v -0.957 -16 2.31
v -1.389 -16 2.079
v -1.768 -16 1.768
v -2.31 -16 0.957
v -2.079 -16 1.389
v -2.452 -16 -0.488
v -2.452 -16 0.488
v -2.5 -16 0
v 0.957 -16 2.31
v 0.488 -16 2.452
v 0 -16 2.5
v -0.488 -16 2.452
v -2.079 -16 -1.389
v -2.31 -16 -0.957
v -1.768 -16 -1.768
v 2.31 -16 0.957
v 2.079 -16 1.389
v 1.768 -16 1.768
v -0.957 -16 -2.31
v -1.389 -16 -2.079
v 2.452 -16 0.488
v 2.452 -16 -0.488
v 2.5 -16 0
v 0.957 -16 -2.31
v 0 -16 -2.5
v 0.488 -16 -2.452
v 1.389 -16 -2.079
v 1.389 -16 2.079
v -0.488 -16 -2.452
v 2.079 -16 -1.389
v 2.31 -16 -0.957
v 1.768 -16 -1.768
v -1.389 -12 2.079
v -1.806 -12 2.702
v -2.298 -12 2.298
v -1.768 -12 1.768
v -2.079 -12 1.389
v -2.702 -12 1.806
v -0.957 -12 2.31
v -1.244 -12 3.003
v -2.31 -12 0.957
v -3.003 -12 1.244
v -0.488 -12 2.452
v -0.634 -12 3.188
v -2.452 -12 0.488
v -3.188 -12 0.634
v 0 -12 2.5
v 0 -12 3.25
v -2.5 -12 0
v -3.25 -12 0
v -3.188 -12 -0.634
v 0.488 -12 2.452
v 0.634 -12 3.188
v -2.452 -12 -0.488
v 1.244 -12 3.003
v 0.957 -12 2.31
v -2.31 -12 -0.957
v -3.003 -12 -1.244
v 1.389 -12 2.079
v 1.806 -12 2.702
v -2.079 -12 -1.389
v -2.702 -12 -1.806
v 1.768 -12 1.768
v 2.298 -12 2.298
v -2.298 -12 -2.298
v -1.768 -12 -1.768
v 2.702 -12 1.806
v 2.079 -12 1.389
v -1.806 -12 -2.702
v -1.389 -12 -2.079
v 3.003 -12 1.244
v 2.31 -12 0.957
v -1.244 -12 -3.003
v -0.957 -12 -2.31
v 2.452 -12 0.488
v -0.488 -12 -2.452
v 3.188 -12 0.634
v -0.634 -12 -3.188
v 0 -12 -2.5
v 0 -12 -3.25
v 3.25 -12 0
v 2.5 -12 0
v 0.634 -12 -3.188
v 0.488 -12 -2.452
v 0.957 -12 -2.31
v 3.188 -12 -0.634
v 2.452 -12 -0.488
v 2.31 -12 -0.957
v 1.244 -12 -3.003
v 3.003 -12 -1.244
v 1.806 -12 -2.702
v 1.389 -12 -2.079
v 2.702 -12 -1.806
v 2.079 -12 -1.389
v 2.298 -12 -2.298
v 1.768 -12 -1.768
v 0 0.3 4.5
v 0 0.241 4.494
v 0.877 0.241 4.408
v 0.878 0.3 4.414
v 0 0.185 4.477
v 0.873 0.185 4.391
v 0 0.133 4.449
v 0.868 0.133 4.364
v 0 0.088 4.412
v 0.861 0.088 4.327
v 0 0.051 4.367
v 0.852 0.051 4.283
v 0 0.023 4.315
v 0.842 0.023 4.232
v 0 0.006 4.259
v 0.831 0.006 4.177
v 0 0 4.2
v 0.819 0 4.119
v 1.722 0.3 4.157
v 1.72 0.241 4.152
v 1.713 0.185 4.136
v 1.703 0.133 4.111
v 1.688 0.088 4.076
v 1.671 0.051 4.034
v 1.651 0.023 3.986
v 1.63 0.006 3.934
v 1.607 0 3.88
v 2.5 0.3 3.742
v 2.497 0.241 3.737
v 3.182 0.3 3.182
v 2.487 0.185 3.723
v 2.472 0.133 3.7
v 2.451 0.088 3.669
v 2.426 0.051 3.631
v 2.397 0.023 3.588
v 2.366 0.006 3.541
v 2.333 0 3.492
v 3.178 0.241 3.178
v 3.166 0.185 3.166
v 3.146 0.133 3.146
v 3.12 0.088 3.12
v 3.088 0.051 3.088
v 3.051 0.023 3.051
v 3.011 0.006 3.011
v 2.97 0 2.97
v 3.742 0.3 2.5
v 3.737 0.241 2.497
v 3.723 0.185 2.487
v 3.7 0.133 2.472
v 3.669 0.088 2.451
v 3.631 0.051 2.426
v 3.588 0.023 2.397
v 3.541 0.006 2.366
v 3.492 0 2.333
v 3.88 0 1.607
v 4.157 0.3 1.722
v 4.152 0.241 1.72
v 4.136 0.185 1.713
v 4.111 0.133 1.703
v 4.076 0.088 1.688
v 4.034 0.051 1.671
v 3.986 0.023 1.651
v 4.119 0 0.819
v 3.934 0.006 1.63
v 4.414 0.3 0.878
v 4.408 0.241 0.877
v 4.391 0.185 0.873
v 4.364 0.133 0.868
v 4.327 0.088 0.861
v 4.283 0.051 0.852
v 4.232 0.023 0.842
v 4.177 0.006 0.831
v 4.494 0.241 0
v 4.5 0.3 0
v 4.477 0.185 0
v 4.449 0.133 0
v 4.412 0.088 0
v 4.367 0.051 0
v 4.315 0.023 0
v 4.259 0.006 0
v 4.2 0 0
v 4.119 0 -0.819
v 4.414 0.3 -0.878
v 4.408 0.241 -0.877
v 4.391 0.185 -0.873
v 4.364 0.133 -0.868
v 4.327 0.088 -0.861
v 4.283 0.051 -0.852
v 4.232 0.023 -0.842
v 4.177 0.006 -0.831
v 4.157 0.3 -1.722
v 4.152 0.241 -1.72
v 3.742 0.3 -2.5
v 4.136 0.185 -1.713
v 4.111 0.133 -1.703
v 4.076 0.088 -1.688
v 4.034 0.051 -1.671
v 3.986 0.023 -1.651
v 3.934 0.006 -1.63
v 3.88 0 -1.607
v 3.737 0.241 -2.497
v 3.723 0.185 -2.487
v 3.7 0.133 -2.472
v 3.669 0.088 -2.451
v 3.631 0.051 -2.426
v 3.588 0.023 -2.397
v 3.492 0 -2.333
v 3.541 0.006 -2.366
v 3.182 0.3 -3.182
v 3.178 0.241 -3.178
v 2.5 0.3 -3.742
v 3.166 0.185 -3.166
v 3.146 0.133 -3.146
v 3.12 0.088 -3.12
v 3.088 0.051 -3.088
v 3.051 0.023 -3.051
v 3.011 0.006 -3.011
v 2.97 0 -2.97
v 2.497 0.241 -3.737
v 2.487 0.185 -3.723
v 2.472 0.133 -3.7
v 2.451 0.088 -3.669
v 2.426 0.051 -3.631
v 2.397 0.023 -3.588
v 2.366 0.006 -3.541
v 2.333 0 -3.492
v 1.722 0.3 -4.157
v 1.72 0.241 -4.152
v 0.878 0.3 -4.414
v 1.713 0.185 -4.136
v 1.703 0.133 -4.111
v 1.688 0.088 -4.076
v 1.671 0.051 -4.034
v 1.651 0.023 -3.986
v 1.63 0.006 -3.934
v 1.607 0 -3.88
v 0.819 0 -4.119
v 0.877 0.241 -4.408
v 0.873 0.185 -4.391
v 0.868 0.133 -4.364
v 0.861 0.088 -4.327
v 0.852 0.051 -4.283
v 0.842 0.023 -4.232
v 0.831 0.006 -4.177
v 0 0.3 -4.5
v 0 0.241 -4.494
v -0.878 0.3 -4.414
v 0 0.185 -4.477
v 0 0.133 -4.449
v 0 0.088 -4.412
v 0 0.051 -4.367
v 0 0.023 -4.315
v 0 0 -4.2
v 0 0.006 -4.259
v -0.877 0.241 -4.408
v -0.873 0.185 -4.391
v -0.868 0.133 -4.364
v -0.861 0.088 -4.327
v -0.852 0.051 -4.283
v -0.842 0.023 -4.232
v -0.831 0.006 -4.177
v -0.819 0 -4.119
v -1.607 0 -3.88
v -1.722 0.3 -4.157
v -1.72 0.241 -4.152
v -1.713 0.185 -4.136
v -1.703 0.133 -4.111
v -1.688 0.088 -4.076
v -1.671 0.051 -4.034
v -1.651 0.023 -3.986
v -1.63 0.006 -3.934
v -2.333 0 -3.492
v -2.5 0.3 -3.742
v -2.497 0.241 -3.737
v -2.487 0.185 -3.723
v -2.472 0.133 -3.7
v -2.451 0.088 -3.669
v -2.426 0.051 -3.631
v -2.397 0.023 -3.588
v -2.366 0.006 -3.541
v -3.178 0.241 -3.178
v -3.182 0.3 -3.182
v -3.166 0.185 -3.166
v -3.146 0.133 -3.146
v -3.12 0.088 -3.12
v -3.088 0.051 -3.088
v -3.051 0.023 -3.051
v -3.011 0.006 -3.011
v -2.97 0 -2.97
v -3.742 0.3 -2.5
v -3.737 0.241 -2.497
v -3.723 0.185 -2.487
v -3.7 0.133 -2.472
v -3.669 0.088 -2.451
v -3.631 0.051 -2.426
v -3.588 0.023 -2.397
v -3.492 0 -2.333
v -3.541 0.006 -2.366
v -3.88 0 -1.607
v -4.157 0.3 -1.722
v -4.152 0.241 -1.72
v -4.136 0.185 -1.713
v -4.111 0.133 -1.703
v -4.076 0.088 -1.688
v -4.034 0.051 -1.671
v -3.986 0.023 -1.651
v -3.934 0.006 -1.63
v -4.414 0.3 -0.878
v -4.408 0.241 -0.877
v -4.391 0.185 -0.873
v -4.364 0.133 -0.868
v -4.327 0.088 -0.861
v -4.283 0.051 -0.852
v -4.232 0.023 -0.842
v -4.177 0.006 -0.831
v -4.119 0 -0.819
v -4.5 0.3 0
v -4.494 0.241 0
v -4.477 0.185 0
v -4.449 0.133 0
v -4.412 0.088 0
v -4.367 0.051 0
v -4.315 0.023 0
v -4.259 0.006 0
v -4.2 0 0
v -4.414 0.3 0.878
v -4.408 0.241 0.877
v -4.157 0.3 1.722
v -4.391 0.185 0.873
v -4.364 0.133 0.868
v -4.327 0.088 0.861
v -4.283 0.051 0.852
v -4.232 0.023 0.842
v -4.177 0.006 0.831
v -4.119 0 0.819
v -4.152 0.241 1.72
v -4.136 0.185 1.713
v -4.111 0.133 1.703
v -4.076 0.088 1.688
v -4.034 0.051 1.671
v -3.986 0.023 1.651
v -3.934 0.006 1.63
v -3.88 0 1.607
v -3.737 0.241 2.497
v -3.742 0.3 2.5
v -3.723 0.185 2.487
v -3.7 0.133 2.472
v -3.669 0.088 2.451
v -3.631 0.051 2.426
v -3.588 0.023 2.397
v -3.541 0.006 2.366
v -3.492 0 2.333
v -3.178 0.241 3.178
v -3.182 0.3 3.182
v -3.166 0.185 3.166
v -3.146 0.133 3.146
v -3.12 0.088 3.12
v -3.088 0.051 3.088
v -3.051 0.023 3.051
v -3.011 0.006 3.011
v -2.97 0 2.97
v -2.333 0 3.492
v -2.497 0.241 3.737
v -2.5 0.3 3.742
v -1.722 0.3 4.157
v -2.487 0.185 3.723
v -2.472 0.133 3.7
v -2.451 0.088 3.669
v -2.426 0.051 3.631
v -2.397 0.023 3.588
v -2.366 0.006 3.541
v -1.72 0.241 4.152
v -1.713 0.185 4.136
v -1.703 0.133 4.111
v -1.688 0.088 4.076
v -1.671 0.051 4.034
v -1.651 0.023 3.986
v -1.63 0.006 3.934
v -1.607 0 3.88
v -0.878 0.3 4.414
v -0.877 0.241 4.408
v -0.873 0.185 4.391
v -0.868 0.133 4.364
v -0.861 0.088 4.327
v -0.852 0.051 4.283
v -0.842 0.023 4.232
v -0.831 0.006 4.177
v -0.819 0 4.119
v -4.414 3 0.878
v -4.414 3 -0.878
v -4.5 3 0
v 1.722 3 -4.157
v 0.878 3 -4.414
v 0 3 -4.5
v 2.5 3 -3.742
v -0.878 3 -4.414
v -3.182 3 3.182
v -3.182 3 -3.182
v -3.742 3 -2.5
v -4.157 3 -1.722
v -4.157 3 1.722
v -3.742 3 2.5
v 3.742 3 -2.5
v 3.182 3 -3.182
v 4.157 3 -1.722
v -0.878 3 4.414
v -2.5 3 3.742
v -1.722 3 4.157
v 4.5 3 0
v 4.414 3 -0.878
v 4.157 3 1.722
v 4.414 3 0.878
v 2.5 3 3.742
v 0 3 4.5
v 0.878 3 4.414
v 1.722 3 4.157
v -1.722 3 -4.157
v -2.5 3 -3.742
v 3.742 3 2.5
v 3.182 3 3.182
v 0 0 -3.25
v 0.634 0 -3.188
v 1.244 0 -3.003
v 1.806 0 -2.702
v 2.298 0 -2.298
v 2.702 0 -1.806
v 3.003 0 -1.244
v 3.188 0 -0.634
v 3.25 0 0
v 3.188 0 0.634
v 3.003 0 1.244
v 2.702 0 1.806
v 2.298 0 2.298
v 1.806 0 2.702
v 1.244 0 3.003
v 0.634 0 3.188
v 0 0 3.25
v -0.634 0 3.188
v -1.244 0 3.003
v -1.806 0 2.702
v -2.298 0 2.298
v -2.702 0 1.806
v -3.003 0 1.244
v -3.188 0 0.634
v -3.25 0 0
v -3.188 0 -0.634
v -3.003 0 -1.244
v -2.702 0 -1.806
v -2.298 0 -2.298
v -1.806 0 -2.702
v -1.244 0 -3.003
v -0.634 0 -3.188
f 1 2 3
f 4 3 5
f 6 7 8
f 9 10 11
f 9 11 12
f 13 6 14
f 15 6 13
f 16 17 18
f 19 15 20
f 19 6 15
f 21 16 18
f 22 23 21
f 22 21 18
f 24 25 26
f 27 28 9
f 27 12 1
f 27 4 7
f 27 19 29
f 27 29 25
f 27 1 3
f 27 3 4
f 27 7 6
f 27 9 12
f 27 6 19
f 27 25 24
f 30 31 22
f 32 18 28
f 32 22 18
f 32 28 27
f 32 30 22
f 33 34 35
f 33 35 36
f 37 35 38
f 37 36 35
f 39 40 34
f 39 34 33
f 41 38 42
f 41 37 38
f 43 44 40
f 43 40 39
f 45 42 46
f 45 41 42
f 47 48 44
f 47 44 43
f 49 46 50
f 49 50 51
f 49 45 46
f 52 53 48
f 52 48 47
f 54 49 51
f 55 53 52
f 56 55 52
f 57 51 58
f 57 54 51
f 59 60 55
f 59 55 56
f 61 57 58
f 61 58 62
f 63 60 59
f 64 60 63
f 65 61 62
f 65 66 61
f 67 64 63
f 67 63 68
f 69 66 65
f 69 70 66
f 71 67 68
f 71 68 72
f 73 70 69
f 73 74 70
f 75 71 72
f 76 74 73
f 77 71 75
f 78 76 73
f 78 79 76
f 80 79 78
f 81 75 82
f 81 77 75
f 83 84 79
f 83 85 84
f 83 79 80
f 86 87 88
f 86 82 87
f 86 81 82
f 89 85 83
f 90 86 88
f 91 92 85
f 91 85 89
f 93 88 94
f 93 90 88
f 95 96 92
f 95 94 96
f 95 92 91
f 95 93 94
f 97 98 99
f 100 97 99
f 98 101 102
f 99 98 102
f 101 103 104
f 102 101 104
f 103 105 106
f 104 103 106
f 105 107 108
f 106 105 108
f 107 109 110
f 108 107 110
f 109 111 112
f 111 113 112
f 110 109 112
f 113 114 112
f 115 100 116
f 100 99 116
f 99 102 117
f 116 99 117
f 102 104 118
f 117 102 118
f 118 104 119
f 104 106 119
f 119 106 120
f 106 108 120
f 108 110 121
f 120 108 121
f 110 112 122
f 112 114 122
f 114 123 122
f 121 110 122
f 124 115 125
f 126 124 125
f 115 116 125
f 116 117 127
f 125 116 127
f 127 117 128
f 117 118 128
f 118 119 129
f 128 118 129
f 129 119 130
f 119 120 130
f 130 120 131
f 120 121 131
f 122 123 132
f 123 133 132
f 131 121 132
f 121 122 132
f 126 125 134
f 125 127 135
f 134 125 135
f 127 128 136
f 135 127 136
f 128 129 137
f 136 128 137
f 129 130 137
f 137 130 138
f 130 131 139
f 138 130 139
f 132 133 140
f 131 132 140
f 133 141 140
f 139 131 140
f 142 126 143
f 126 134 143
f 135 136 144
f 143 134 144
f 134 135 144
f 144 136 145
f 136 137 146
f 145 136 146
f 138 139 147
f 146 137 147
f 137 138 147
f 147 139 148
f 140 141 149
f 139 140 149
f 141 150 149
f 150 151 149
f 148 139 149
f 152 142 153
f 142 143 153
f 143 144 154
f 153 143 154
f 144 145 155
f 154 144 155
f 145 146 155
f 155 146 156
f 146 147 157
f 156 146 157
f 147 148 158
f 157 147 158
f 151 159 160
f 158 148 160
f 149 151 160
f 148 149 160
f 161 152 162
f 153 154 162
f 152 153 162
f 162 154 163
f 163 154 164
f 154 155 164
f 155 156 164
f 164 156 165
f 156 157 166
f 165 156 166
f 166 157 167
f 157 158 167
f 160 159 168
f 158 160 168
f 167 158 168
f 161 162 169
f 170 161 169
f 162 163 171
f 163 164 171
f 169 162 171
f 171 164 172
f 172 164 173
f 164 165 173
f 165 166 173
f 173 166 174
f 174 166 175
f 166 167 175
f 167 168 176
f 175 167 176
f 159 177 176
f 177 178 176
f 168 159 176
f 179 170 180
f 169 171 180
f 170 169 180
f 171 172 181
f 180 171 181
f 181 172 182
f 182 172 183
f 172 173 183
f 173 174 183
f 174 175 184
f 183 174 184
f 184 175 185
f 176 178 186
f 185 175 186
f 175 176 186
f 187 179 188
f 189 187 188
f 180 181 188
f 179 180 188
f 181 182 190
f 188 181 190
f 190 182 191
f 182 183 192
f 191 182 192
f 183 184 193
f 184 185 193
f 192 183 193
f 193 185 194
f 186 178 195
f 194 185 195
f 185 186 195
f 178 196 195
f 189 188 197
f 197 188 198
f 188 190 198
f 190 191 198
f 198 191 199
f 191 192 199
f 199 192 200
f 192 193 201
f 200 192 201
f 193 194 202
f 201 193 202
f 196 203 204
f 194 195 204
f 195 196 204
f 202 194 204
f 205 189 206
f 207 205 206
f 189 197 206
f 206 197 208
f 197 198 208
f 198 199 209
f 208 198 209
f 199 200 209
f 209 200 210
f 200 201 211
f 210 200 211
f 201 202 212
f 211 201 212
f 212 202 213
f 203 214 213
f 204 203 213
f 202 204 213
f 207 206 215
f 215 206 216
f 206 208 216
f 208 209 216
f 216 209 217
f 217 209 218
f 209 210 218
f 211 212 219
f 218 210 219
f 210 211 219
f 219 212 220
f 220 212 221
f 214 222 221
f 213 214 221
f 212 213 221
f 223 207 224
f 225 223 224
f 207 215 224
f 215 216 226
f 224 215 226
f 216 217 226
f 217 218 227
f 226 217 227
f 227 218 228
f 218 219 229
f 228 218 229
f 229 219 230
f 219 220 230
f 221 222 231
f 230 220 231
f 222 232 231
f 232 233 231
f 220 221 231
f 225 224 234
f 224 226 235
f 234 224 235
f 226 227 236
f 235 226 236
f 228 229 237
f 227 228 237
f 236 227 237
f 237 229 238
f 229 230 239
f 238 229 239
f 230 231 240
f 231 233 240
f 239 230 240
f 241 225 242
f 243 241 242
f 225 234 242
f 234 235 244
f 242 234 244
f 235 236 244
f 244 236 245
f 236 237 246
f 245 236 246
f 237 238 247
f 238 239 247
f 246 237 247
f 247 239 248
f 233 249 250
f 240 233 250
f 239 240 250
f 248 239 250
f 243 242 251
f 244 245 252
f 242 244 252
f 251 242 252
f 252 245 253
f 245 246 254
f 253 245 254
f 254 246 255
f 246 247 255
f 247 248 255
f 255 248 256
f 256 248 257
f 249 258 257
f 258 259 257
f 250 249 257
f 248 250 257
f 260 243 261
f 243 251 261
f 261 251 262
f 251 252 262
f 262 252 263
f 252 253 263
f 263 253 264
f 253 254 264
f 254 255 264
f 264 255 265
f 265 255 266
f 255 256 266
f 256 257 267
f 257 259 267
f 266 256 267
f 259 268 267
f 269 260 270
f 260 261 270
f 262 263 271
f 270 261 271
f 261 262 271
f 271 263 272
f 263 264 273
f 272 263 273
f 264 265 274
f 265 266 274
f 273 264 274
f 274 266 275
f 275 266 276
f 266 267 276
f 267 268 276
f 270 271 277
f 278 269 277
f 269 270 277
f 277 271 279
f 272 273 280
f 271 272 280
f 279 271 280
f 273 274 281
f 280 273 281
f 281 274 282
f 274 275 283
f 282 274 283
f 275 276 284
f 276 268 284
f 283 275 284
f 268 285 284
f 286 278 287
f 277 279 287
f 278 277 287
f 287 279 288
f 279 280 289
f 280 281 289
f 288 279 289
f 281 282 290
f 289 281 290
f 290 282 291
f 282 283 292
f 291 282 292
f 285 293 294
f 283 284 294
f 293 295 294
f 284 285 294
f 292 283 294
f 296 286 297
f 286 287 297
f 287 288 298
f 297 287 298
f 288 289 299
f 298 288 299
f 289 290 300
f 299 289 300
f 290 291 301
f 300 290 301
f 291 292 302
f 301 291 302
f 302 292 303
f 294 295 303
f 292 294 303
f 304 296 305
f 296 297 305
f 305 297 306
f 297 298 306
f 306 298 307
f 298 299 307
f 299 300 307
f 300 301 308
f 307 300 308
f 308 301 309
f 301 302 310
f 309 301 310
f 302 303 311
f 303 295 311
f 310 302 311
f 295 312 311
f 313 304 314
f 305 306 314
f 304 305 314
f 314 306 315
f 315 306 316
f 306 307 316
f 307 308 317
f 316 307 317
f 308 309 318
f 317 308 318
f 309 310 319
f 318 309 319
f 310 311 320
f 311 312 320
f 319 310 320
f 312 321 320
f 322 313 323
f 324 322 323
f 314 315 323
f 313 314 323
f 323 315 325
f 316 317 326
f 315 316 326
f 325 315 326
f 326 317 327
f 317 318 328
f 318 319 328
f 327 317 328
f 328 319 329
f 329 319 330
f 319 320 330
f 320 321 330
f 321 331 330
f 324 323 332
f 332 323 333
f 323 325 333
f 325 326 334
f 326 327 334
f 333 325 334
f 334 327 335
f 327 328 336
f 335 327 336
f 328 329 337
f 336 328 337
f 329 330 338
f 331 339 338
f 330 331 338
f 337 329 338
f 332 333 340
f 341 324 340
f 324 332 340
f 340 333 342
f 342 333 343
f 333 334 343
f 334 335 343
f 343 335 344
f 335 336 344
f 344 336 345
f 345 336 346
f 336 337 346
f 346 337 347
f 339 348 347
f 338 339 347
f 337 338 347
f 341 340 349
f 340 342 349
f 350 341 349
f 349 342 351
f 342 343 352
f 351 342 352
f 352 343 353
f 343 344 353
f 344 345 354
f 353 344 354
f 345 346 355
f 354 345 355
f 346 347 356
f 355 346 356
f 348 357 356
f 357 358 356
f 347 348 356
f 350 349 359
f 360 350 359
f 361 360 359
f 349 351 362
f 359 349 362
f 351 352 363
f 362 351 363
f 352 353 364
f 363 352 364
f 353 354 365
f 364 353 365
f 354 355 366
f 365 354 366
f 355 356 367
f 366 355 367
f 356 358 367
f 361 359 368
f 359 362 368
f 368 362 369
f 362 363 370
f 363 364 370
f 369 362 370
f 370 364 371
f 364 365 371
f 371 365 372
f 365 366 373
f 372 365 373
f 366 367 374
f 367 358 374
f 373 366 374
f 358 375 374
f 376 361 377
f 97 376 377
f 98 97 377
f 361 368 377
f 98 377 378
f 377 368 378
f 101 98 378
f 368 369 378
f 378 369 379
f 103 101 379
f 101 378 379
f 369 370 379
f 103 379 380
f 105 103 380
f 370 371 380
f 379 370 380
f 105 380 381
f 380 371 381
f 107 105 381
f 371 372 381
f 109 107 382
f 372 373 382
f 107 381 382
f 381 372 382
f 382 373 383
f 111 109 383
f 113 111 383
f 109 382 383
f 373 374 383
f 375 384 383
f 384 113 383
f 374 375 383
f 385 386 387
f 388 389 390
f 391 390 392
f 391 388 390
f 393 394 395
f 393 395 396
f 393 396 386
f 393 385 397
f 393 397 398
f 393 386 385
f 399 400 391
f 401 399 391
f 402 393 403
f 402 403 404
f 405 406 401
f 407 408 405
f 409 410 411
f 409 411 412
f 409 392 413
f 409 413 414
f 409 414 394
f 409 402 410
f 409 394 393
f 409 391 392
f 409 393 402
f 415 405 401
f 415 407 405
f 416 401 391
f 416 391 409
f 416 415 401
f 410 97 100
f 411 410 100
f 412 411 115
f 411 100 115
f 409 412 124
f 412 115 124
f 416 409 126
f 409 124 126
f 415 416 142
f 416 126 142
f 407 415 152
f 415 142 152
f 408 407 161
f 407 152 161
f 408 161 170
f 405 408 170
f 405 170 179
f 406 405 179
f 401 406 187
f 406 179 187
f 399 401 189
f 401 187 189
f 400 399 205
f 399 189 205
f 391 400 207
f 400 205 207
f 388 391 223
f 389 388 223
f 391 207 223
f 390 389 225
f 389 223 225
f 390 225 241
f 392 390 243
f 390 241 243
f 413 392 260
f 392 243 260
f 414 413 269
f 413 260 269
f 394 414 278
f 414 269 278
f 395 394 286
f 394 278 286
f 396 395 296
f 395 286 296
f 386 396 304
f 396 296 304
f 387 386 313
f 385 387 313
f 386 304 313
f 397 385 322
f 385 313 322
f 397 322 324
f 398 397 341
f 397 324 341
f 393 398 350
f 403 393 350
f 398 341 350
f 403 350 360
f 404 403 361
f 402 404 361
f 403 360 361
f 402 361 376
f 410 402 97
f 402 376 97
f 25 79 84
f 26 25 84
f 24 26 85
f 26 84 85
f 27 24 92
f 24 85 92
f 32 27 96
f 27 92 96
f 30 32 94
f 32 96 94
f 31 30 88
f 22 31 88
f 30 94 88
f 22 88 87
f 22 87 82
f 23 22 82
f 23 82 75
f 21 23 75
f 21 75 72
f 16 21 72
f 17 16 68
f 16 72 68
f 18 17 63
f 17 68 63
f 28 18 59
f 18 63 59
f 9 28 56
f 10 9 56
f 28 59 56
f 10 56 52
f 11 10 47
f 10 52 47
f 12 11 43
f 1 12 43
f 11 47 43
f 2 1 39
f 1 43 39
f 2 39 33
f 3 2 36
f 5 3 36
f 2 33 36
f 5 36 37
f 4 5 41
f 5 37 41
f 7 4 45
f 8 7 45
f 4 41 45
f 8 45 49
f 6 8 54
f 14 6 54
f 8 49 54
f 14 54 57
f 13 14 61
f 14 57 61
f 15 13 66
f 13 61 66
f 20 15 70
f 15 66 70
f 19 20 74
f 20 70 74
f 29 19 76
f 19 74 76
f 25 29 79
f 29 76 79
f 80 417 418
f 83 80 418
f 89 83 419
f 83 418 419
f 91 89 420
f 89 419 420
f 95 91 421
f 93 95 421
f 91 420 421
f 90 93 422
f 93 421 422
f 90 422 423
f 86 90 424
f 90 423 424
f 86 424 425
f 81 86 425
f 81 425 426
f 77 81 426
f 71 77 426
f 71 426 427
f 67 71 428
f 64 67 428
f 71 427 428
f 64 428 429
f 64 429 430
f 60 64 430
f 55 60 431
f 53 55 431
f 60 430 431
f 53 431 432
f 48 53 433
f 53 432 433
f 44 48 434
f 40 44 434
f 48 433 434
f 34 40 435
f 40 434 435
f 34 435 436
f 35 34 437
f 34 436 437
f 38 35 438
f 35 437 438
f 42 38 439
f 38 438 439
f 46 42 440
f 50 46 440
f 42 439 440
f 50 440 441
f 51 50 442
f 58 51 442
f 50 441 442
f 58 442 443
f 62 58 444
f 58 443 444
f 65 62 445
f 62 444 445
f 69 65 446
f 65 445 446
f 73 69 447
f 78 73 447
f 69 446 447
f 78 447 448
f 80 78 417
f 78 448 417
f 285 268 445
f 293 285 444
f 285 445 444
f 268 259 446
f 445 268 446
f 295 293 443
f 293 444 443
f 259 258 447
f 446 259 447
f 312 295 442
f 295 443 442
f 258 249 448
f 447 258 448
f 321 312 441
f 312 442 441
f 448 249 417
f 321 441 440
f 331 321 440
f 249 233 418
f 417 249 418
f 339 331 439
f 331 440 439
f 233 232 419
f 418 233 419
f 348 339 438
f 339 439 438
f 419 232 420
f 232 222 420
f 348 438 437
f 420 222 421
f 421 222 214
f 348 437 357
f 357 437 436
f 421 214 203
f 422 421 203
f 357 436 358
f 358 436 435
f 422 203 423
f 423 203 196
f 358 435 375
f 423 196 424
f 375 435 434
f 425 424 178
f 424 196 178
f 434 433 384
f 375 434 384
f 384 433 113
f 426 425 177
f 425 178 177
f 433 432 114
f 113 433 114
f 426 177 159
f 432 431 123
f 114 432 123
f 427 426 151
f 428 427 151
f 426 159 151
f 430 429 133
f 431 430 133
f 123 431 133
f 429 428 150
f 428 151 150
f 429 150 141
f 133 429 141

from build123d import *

# Parameters (mm, degrees)
ESBO_O1_R                = 4.5
RESSALTO_EXTRUS_O1_DEPTH = 3
ESBO_O2_R                = 3.25
RESSALTO_EXTRUS_O2_DEPTH = 12
ESBO_O3_R                = 2.5
RESSALTO_EXTRUS_O3_DEPTH = 4
FILETE2_R                = 0.3


with BuildPart() as part:
    # Esboço1 → Ressalto-extrusão1 (new body)
    with BuildSketch(Plane(origin=(0, 0, 0), x_dir=(1, 0, 0), z_dir=(0, 1, 0))):
        with Locations(Location((0, 0, 0), (0, 0, 270))):
            Circle(ESBO_O1_R)
    extrude(amount=RESSALTO_EXTRUS_O1_DEPTH)

    # Esboço2 → Ressalto-extrusão2 (add)
    with BuildSketch(Plane.XZ):
        with Locations(Location((0, 0, 0), (0, 0, 270))):
            Circle(ESBO_O2_R)
    extrude(amount=RESSALTO_EXTRUS_O2_DEPTH)

    # Esboço3 → Ressalto-extrusão3 (add)
    with BuildSketch(Plane.XZ.offset(12)):
        with Locations(Location((0, 0, 0), (0, 0, 270))):
            Circle(ESBO_O3_R)
    extrude(amount=RESSALTO_EXTRUS_O3_DEPTH)

    # Filete2
    filete2_edges = [part.edges().sort_by_distance(p)[0] for p in [
        (0, 0, -4.5),
    ]]
    fillet(filete2_edges, radius=FILETE2_R)


solid = part.part
